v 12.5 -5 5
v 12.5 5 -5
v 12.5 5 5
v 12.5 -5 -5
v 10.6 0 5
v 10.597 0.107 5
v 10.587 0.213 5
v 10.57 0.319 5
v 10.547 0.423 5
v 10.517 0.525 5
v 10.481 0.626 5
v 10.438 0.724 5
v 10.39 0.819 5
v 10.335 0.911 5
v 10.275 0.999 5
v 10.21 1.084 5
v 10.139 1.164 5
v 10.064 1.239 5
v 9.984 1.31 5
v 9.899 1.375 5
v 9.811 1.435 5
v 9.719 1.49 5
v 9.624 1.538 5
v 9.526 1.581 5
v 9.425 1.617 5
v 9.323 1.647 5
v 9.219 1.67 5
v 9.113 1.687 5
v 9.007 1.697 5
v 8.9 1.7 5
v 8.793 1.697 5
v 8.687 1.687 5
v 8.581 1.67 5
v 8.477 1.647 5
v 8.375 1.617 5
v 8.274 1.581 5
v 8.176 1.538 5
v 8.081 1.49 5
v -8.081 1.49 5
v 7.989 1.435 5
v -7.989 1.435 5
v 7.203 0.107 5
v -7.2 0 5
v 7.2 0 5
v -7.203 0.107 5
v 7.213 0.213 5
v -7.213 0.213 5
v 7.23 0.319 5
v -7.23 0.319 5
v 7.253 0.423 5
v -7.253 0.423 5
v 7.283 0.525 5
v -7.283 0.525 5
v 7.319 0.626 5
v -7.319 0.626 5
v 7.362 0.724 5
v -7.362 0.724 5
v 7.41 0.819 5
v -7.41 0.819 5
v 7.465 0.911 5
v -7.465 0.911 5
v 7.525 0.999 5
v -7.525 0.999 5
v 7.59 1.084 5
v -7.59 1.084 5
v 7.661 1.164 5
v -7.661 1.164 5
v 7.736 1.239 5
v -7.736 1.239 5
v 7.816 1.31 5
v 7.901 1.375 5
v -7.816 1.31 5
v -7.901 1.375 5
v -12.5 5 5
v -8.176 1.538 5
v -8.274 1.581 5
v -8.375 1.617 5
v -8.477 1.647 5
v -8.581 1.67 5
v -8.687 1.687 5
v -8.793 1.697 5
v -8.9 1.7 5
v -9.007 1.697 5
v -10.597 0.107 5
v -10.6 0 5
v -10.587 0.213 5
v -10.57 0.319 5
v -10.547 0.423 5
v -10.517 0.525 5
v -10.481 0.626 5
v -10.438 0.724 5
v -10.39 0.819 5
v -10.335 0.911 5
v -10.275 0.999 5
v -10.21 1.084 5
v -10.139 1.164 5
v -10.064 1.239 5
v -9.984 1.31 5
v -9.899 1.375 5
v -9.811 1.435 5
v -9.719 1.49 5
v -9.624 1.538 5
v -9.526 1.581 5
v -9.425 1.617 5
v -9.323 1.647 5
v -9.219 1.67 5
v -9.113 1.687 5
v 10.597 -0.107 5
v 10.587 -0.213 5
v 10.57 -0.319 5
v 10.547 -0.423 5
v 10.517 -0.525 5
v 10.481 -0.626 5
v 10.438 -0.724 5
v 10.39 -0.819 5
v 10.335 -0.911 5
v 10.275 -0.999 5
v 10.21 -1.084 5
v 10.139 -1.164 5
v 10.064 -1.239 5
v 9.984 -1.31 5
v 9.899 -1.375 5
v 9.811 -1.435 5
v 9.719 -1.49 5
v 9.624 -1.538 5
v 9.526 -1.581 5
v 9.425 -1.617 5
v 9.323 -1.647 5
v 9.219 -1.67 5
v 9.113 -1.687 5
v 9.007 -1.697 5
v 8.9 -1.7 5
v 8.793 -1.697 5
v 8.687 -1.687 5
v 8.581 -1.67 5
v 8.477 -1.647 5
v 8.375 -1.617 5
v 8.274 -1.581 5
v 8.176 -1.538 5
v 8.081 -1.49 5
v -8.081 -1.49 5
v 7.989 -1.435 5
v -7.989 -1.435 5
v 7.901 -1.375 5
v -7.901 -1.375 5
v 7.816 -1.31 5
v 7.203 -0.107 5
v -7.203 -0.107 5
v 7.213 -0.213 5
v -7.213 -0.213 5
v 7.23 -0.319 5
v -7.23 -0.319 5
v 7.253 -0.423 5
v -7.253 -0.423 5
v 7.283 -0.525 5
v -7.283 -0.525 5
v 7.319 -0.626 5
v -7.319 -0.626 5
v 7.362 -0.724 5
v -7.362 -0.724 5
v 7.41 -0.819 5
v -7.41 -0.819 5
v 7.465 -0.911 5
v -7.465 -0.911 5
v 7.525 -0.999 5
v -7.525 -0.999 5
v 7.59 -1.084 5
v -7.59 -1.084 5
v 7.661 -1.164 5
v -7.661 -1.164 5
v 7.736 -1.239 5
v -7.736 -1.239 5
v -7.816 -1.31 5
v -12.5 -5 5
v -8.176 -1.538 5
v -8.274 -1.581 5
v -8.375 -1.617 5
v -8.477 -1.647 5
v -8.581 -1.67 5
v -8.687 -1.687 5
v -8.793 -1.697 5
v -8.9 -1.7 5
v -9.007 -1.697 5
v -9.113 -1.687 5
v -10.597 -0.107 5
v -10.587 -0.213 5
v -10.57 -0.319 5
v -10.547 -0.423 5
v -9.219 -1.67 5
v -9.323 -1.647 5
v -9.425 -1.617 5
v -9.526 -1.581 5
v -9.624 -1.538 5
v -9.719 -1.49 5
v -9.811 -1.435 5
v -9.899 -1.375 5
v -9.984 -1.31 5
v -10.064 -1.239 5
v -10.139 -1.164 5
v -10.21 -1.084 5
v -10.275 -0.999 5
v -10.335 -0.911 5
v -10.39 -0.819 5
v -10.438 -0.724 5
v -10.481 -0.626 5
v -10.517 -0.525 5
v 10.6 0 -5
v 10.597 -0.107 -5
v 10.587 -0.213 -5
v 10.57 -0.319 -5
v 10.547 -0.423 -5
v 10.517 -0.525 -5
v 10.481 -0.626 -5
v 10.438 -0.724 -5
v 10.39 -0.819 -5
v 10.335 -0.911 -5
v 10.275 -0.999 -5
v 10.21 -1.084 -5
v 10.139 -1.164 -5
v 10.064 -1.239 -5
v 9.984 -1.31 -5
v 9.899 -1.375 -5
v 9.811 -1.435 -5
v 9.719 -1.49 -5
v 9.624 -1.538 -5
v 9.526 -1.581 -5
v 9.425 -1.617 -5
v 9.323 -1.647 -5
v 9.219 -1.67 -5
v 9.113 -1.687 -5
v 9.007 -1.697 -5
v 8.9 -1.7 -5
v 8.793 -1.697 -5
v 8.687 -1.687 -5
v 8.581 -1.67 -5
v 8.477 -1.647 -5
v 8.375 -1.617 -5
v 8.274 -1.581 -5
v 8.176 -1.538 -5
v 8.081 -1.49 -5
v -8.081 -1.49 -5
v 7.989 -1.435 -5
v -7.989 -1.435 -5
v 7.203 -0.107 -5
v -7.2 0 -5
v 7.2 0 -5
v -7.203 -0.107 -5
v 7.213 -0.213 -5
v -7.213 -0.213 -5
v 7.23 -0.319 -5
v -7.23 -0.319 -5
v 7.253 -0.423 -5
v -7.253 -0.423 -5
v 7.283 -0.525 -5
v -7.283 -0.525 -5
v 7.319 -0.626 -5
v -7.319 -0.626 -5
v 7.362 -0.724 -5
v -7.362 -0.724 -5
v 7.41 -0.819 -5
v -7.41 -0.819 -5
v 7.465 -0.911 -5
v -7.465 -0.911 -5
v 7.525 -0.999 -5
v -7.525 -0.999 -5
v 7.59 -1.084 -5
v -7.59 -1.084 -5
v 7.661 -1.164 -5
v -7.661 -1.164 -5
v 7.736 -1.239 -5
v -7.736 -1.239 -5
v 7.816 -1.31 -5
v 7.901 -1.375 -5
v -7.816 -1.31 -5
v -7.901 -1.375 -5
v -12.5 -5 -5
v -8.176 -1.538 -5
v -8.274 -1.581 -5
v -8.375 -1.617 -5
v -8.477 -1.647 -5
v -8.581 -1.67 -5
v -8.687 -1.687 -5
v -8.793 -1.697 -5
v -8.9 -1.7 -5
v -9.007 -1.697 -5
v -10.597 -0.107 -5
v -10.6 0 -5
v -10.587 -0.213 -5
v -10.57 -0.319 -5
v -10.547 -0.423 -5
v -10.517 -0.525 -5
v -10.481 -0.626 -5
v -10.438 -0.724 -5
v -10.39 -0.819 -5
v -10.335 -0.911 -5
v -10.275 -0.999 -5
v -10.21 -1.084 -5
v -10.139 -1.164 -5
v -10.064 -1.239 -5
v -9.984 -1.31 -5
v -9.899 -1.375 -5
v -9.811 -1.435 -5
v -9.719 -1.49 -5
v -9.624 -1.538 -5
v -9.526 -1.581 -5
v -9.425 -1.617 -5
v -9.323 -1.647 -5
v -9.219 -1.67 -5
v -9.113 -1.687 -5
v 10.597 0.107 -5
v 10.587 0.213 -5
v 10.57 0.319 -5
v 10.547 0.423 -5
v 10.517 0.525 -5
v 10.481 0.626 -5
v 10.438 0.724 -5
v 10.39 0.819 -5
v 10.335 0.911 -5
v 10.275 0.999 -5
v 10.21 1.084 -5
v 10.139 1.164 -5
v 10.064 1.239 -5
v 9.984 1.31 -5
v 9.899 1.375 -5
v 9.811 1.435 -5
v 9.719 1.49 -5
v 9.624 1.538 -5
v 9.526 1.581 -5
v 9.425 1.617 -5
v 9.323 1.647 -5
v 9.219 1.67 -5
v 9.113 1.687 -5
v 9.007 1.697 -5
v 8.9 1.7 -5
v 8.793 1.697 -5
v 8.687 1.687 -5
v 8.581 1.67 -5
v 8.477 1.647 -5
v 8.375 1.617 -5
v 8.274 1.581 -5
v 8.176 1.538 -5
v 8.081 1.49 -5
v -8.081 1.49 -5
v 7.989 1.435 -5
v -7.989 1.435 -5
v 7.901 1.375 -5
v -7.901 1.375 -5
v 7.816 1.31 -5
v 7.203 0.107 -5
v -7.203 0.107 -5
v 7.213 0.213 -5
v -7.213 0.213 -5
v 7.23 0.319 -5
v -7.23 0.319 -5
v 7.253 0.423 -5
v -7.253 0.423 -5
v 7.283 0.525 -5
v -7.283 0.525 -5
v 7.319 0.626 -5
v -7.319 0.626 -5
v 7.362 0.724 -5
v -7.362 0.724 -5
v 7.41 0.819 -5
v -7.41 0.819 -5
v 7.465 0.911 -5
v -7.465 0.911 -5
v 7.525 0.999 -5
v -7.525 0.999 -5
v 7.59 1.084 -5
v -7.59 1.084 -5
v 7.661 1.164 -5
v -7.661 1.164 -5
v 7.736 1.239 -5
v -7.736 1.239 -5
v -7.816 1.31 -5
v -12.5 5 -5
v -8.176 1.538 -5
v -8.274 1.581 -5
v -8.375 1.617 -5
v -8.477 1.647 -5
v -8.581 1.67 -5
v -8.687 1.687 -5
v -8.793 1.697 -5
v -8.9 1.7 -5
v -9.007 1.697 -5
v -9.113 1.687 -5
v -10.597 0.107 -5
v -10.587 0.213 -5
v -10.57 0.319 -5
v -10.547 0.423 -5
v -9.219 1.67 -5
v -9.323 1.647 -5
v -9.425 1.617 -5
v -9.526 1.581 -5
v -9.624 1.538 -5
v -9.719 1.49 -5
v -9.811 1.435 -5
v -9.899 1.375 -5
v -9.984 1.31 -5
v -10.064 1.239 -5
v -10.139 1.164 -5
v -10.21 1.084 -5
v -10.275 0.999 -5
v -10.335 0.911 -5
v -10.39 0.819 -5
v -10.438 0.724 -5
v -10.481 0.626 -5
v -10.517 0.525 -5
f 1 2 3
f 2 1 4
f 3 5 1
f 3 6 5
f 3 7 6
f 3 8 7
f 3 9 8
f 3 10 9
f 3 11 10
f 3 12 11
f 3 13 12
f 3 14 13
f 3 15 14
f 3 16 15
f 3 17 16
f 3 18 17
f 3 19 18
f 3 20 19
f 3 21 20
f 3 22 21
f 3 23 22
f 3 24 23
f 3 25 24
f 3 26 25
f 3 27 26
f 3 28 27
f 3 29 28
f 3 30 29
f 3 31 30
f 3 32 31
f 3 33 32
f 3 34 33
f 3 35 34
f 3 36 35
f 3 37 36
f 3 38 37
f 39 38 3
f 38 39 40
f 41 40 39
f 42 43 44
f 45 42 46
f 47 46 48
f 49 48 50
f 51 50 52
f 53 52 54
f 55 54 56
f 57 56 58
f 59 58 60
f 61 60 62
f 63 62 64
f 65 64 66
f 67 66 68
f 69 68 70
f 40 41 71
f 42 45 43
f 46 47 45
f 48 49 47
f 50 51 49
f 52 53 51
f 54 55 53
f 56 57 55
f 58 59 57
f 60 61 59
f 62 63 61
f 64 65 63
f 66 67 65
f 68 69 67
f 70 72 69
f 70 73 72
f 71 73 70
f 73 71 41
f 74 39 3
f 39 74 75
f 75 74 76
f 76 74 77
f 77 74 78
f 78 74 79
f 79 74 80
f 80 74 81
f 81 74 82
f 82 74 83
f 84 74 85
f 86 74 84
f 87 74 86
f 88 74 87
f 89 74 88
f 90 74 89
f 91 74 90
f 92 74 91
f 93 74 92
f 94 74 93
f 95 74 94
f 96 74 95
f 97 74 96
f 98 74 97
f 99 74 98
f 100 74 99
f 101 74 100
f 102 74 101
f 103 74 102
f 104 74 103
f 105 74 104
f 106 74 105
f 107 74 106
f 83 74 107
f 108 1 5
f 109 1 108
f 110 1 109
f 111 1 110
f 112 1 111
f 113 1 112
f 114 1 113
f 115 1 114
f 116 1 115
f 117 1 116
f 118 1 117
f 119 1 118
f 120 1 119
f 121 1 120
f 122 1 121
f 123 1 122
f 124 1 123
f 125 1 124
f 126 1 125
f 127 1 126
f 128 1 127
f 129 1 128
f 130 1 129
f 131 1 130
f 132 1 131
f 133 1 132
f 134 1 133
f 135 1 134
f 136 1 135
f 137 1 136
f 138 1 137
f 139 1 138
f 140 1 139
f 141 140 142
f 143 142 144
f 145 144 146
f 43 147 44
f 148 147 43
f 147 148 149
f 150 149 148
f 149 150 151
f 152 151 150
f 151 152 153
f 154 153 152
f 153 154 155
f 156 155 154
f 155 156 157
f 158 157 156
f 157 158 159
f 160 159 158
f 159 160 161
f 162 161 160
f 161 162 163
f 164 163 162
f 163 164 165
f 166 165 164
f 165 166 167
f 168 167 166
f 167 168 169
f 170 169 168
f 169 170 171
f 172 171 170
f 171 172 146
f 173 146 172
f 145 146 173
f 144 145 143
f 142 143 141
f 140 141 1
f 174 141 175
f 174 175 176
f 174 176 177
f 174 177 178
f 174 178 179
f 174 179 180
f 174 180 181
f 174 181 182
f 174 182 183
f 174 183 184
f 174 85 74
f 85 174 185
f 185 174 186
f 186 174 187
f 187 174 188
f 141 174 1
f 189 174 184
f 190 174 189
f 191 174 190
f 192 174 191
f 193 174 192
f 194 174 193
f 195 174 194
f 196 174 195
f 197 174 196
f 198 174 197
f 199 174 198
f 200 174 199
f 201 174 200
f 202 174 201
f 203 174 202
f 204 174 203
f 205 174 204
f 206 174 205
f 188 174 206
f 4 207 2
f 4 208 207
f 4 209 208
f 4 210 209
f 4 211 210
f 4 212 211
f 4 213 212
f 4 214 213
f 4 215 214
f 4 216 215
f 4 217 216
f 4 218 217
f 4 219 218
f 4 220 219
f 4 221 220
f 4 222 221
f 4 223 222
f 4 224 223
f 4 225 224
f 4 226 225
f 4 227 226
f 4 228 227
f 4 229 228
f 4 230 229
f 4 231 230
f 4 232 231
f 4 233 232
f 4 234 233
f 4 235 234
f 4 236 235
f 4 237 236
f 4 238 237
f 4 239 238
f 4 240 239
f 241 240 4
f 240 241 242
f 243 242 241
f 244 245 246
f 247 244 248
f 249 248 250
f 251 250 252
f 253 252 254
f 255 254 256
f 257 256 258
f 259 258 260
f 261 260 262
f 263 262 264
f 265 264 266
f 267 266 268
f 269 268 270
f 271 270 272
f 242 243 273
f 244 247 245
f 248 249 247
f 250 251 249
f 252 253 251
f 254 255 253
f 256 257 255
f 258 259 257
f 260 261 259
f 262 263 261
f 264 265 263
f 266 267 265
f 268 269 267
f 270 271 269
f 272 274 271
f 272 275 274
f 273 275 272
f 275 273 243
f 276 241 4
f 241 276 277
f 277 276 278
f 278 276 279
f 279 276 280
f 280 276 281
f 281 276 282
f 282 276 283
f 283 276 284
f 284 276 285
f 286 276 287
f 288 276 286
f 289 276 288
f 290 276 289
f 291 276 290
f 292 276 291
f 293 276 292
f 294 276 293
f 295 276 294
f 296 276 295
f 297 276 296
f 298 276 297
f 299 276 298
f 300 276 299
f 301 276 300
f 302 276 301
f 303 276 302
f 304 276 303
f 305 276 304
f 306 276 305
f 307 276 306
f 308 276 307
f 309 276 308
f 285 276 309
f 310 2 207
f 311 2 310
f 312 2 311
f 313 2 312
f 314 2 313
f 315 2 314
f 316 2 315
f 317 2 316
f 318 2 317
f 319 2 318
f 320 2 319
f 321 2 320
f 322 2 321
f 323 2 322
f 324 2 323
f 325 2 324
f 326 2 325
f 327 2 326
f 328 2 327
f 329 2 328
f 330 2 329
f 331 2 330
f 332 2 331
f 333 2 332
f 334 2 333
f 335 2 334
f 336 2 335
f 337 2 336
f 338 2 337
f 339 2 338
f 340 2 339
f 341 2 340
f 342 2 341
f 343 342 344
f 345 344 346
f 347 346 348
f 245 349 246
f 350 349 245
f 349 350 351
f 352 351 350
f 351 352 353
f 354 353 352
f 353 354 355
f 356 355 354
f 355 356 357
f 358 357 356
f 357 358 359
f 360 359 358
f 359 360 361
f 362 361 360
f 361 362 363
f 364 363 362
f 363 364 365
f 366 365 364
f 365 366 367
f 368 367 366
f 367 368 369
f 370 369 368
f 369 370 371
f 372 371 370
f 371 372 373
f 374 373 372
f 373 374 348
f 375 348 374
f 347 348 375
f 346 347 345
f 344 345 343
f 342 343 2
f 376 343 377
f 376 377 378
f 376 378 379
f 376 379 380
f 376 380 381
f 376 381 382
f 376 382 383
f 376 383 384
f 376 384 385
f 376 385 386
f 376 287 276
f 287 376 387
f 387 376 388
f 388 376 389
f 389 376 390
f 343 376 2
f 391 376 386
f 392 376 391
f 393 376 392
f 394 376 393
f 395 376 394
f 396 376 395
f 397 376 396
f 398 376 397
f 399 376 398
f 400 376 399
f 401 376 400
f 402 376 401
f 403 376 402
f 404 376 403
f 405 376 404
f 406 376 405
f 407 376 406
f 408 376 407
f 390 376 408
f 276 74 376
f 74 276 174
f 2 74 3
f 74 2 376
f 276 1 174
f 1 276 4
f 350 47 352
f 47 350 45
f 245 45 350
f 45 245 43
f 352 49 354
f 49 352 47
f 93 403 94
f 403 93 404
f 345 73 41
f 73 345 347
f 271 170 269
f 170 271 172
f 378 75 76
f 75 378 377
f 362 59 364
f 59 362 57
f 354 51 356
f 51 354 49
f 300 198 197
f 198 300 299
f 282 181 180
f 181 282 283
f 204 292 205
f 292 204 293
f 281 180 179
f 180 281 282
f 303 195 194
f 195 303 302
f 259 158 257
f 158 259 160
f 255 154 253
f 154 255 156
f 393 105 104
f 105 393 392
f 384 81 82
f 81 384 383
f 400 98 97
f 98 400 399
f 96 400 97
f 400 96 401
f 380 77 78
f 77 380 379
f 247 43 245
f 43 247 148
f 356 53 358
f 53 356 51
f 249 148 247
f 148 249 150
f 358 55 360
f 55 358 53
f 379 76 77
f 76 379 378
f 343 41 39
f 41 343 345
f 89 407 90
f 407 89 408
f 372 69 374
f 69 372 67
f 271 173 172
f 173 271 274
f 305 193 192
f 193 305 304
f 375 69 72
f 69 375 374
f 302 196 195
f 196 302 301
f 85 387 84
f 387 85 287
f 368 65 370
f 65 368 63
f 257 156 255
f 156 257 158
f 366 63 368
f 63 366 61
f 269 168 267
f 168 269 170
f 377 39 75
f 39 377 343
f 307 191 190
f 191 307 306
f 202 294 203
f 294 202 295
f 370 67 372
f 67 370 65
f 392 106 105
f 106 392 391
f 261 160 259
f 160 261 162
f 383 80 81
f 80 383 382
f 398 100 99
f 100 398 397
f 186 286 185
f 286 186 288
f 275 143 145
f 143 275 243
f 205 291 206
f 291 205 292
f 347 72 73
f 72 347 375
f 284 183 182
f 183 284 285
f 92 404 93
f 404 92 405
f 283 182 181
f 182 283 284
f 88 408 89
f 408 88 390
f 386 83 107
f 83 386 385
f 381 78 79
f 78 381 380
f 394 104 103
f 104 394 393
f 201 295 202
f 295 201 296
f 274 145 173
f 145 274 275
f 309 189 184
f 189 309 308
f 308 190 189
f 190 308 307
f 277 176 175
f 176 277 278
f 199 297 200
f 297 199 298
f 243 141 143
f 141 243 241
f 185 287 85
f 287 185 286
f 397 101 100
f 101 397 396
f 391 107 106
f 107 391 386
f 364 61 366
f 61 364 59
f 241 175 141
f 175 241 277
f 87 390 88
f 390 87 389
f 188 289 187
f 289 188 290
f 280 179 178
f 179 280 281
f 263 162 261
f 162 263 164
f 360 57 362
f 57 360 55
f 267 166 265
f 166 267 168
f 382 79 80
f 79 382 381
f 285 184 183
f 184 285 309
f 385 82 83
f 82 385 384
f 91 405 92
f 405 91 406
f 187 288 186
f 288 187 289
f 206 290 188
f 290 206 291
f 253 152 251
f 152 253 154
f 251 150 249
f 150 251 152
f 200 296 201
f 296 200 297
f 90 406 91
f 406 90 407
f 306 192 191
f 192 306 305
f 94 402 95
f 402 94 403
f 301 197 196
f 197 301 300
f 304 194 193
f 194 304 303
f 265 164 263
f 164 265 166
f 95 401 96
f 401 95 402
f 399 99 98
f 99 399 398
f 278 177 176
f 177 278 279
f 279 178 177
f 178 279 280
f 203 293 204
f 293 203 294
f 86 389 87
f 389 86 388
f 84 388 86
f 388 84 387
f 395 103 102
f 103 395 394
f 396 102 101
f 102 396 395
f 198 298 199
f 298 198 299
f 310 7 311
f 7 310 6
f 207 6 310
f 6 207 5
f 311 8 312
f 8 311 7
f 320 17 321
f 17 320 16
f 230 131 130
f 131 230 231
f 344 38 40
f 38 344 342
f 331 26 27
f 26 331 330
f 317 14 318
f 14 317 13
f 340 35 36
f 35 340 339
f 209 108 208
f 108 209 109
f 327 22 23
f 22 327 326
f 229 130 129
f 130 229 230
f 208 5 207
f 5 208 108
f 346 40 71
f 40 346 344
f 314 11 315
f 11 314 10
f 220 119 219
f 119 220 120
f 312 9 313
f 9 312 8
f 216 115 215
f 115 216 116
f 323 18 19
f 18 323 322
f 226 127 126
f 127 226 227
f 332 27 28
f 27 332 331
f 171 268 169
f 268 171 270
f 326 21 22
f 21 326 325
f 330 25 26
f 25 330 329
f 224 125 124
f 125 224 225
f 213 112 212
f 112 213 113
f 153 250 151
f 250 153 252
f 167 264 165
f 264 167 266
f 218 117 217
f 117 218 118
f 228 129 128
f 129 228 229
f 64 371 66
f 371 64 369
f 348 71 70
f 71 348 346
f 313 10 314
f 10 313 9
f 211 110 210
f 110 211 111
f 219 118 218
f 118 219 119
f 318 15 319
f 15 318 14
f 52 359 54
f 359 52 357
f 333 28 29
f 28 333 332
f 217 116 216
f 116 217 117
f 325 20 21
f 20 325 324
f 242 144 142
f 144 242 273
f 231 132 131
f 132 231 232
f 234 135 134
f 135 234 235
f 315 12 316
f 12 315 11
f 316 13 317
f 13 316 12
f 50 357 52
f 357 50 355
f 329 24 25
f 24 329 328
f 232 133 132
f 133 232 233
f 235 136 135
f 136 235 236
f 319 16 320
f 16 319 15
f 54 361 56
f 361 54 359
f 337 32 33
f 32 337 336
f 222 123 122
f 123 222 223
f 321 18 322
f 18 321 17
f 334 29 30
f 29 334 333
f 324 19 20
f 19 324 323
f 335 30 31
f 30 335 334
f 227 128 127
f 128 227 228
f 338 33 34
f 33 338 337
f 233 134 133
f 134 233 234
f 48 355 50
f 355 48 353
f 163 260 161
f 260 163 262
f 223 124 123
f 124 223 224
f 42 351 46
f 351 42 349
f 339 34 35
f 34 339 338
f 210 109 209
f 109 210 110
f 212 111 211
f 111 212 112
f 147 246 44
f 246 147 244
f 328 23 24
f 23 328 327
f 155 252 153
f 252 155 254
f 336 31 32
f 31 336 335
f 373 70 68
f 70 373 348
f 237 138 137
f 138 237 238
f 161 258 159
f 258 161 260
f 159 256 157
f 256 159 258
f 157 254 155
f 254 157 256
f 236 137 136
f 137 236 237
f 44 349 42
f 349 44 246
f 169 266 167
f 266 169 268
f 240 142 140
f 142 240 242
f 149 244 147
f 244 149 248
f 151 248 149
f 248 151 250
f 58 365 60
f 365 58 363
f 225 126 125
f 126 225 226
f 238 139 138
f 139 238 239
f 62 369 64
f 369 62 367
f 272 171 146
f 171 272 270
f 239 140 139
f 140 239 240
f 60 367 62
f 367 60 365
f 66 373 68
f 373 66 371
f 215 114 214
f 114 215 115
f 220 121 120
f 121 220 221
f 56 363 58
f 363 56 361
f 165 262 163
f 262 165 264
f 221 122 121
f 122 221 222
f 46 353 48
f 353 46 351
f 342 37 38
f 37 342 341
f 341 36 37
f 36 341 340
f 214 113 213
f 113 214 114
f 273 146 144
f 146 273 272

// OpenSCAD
 /*
    Scanner para análisis tridimensional de cobertura vegetal del suelo
    
    Descripción de la pieza: Tope para sensor de fin de carrera de direccion y
    Cantidad requerida: 1.

    Autor: Matias J. Micheletto    
    Noviembre 2017
    Directores: Rodrigo Santos - Juan Galantini
    Laboratorio de Sistemas Digitales
    Universidad Nacional del Sur - Departamento de Ingeniería Eléctrica y Computadoras    
*/


$fn = 100; // Resolucion del modelo

// Dimensiones exteriores del montaje
W = 25; // Ancho (en direccion X)
L = 10; // Largo (en direccion Y)
H = 10; // Alto (en direccion Z)

r2 = 1.7; // Radio de los orificios para tornillos
d = 17.8; // Separacion entre los orificios

difference(){    
    cube([W,L,H],center = true);
    
    translate([-d/2,0,0])   
        cylinder(r = r2, h = H, center = true);
    translate([d/2,0,0])   
        cylinder(r = r2, h = H, center = true);
}
